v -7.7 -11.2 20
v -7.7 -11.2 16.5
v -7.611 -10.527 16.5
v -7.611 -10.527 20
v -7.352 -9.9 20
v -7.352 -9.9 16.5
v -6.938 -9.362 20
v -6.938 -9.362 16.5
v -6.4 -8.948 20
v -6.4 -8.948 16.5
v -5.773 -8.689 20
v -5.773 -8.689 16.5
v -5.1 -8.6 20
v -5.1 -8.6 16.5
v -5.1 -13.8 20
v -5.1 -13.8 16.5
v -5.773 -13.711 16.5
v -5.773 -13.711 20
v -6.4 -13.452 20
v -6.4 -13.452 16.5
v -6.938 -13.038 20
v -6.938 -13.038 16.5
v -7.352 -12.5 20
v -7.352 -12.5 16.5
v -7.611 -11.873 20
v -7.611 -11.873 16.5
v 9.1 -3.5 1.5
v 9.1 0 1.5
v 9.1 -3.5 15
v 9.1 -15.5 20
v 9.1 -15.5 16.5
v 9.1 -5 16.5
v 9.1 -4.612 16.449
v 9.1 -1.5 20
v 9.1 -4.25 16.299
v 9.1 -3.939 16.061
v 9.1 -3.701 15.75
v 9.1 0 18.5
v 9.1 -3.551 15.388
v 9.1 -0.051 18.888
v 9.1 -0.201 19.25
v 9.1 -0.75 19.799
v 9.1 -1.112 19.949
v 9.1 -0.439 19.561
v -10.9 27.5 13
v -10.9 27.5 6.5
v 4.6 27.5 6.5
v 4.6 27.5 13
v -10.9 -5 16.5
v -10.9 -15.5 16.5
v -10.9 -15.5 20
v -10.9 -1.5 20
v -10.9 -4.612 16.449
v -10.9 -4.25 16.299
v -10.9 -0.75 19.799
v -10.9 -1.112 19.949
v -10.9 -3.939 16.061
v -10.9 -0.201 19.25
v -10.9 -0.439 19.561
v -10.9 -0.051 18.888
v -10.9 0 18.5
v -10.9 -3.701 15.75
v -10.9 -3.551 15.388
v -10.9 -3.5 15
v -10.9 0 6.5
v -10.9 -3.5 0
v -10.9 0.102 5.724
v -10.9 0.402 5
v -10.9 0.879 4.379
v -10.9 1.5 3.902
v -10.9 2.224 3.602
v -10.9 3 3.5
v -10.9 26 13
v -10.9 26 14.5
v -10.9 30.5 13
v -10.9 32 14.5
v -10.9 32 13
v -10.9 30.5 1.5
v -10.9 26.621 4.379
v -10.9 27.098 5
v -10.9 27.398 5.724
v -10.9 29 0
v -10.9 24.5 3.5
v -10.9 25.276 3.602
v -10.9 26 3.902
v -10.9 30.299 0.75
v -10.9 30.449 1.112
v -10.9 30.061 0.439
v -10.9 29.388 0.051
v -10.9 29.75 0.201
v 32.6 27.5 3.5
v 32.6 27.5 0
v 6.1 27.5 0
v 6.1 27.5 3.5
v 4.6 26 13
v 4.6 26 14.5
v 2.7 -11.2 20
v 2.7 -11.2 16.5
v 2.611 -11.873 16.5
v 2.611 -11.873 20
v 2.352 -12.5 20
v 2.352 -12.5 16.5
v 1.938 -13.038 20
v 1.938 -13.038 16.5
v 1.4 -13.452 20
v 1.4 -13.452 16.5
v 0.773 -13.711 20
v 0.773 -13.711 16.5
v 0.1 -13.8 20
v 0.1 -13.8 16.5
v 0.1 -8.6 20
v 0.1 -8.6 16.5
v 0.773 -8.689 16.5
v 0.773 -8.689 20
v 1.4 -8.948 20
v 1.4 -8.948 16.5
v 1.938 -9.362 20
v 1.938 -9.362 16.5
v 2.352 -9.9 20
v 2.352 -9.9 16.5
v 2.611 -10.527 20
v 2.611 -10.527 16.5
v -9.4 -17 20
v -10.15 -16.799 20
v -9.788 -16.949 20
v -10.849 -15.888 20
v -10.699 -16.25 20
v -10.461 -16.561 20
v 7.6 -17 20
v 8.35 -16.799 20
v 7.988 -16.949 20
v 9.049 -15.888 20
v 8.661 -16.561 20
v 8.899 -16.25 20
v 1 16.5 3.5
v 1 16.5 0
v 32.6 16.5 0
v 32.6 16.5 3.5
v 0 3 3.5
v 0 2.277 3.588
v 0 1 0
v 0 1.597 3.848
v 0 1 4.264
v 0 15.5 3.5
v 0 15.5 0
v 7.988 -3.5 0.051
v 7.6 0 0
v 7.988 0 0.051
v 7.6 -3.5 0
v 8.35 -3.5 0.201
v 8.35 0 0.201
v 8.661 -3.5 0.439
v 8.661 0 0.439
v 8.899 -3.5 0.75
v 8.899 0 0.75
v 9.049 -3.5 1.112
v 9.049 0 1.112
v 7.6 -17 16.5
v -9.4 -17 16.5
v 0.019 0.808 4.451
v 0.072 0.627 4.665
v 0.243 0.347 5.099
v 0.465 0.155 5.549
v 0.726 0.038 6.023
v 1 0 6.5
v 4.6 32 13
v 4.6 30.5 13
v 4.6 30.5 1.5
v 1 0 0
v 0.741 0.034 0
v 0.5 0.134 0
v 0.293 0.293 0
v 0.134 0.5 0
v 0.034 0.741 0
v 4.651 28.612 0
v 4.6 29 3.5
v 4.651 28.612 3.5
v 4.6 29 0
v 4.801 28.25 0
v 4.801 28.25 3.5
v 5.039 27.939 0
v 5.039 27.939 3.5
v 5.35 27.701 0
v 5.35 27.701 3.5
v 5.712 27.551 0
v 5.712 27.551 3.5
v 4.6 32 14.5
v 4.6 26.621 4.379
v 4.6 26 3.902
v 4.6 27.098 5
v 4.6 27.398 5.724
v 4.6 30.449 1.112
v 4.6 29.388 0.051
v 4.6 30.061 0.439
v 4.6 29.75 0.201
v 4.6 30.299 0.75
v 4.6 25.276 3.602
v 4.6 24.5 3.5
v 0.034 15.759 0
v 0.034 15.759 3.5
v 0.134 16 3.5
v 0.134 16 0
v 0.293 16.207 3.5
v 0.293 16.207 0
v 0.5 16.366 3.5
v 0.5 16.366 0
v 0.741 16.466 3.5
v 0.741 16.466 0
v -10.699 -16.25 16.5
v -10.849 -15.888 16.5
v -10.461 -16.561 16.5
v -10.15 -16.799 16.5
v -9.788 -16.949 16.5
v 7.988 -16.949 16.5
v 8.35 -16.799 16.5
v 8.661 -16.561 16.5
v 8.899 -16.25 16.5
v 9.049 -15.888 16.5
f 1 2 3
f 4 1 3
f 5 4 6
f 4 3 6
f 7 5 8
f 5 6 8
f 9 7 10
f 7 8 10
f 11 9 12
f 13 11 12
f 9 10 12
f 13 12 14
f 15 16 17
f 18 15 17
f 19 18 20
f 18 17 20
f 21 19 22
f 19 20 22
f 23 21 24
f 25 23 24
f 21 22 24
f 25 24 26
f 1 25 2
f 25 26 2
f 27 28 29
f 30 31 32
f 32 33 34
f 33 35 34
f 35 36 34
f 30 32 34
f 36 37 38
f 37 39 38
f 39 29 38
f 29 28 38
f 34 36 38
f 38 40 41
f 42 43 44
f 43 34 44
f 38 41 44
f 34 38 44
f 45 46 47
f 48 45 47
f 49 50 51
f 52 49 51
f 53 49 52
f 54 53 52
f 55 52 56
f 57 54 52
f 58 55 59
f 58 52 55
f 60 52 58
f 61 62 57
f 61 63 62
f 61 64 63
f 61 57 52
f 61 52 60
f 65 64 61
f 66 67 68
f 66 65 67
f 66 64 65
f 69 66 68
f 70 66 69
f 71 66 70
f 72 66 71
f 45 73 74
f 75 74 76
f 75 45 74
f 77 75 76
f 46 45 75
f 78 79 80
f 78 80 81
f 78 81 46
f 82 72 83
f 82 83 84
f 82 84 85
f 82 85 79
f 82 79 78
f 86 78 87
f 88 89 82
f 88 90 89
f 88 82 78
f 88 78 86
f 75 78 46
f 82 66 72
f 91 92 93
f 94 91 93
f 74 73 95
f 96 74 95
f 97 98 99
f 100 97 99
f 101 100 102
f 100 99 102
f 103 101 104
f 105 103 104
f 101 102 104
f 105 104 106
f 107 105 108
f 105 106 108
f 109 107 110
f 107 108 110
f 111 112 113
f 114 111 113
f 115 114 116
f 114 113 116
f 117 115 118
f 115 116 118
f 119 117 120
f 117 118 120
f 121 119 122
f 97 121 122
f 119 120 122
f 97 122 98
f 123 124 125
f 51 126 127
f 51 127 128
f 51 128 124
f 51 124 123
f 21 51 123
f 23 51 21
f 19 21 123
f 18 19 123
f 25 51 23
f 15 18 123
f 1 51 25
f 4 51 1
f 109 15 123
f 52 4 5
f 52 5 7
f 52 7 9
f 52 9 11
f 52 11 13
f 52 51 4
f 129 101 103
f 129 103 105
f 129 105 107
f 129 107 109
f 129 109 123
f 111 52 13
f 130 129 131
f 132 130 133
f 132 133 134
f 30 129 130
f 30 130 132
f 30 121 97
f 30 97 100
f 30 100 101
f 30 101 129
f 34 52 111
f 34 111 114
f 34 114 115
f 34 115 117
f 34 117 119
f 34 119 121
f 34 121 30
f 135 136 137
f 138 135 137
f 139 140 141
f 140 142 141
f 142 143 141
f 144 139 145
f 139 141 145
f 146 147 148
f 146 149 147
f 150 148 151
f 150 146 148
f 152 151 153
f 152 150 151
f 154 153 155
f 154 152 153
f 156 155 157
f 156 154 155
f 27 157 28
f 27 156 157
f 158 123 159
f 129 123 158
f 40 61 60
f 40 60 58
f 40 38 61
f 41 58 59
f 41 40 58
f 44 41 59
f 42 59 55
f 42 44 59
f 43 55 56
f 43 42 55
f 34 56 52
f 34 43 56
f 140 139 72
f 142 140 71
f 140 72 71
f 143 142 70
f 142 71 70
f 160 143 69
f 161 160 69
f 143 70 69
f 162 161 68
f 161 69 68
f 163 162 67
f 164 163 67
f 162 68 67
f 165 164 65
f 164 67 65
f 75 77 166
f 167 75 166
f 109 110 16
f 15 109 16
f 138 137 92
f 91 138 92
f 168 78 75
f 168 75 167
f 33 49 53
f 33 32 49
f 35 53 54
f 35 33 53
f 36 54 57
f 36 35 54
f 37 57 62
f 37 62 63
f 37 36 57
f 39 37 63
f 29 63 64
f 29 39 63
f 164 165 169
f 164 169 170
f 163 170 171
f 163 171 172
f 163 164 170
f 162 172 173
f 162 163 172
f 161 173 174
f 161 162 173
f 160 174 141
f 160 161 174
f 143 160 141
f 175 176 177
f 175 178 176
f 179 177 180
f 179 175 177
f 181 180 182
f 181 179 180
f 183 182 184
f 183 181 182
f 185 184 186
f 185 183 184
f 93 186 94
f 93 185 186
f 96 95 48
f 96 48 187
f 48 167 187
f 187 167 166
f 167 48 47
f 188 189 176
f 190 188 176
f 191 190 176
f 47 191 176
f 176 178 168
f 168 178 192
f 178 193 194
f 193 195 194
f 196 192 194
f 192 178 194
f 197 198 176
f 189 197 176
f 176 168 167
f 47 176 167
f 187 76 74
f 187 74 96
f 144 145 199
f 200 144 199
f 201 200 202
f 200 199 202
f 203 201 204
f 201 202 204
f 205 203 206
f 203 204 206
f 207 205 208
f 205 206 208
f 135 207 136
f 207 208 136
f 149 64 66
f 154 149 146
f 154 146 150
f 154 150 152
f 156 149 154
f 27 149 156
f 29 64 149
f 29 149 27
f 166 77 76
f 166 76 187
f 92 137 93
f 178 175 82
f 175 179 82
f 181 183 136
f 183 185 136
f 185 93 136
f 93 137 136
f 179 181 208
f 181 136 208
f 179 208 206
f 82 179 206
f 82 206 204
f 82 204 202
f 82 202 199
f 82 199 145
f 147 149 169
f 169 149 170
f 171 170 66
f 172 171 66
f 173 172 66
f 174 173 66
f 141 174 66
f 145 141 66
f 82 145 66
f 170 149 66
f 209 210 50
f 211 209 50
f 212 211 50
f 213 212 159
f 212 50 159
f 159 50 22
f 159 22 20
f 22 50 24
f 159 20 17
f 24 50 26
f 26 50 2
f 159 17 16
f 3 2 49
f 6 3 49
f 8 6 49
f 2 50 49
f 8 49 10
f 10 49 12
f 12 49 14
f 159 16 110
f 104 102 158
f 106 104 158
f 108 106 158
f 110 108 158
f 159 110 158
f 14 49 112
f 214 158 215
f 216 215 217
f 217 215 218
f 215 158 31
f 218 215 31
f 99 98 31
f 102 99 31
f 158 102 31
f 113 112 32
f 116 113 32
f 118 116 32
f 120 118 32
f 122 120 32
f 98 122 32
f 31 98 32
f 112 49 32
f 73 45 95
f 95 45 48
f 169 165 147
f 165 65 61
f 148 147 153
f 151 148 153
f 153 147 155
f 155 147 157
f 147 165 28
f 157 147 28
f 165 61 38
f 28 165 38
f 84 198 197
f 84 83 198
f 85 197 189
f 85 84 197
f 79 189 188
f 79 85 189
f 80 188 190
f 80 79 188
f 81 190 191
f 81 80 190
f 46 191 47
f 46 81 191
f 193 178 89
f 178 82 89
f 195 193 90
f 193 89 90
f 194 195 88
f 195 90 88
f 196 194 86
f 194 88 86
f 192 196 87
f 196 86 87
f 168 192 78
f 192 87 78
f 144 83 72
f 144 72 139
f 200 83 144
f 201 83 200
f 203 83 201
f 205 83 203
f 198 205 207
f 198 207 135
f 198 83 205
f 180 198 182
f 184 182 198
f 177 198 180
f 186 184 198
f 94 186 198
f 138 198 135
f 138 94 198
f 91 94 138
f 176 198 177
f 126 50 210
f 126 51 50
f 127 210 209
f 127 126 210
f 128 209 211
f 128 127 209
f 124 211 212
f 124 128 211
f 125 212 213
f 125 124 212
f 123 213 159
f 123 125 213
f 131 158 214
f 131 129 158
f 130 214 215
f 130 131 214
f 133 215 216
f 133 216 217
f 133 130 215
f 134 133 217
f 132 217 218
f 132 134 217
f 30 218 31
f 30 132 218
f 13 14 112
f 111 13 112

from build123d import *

# Parameters (mm, degrees)
BOSS_EXTRUDE1_DEPTH = 3.5
SKETCH2_W           = 20
SKETCH2_H           = 20
BOSS_EXTRUDE2_DEPTH = 3.5
SKETCH3_W           = 20
SKETCH3_H           = 3.5
BOSS_EXTRUDE3_DEPTH = 13.5
BOSS_EXTRUDE4_DEPTH = 3
SKETCH5_W           = 15.5
SKETCH5_H           = 6
BOSS_EXTRUDE5_DEPTH = 1.5
FILLET1_R           = 1
FILLET2_R           = 3
FILLET3_R           = 1.5
CUT_EXTRUDE1_DEPTH  = 3.5


with BuildPart() as part:
    # Sketch1 → Boss-Extrude1 (new body)
    with BuildSketch(Plane.XY):
        with BuildLine():
            Line((0, 0), (0, 15.5))
            ThreePointArc((0, 15.5), (0.292893219, 16.207106781), (1, 16.5))
            Line((1, 16.5), (32.6, 16.5))
            Line((32.6, 16.5), (32.6, 27.5))
            Line((32.6, 27.5), (-10.9, 27.5))
            Line((-10.9, 27.5), (-10.9, 0))
            Line((-10.9, 0), (0, 0))
        make_face()
    extrude(amount=BOSS_EXTRUDE1_DEPTH)

    # Sketch2 → Boss-Extrude2 (add)
    with BuildSketch(Plane.XZ):
        with Locations((-0.9, 10)):
            Rectangle(SKETCH2_W, SKETCH2_H)
    extrude(amount=BOSS_EXTRUDE2_DEPTH)

    # Sketch3 → Boss-Extrude3 (add)
    with BuildSketch(Plane.XZ.offset(3.5)):
        with Locations((-0.9, 18.25)):
            Rectangle(SKETCH3_W, SKETCH3_H)
    extrude(amount=BOSS_EXTRUDE3_DEPTH)

    # Sketch4 → Boss-Extrude4 (add)
    with BuildSketch(Plane(origin=(0, 27.5, 0), x_dir=(1, 0, 0), z_dir=(0, 1, 0))):
        Polygon((-10.9, 0), (-10.9, -3.5), (-10.9, -13), (4.6, -13), (4.6, -3.5), (4.6, 0), align=None)
    extrude(amount=BOSS_EXTRUDE4_DEPTH)

    # Sketch5 → Boss-Extrude5 (add)
    with BuildSketch(Plane.XY.offset(13)):
        with Locations((-3.15, 29)):
            Rectangle(SKETCH5_W, SKETCH5_H)
    extrude(amount=BOSS_EXTRUDE5_DEPTH)

    # Fillet1
    fillet1_edges = [part.edges().sort_by_distance(p)[0] for p in [
        (0, 0, 1.75),
    ]]
    fillet(fillet1_edges, radius=FILLET1_R)

    # Fillet2
    fillet2_edges = [part.edges().sort_by_distance(p)[0] for p in [
        (-4.95, 0, 3.5),
        (-3.15, 27.5, 3.5),
    ]]
    fillet(fillet2_edges, radius=FILLET2_R)

    # Fillet3
    fillet3_edges = [part.edges().sort_by_distance(p)[0] for p in [
        (9.1, -1.75, 0),
        (-0.9, -3.5, 16.5),
        (9.1, -17, 18.25),
        (-10.9, -17, 18.25),
        (4.6, 27.5, 1.75),
        (-3.15, 30.5, 0),
        (-0.9, 0, 20),
    ]]
    fillet(fillet3_edges, radius=FILLET3_R - 0.0001)  # a hair under: the kernel refuses the full size

    # Sketch6 → Cut-Extrude1 (cut)
    with BuildSketch(Plane(origin=(0, 0, 16.5), x_dir=(-1, 0, 0), z_dir=(0, 0, -1))):
        with BuildLine():
            ThreePointArc((5.1, -8.6), (3.261522369, -9.361522369), (2.5, -11.2))
            Line((2.5, -11.2), (7.7, -11.2))
            ThreePointArc((7.7, -11.2), (6.938477631, -9.361522369), (5.1, -8.6))
        make_face()
        with BuildLine():
            Line((7.7, -11.2), (2.5, -11.2))
            ThreePointArc((2.5, -11.2), (3.261522369, -13.038477631), (5.1, -13.8))
            ThreePointArc((5.1, -13.8), (6.938477631, -13.038477631), (7.7, -11.2))
        make_face()
        with BuildLine():
            ThreePointArc((5.1, -13.8), (3.261522369, -13.038477631), (2.5, -11.2))
            ThreePointArc((2.5, -11.2), (1.738477631, -13.038477631), (-0.1, -13.8))
            Line((-0.1, -13.8), (5.1, -13.8))
        make_face()
        with BuildLine():
            ThreePointArc((-0.1, -8.6), (1.738477631, -9.361522369), (2.5, -11.2))
            ThreePointArc((2.5, -11.2), (3.261522369, -9.361522369), (5.1, -8.6))
            Line((5.1, -8.6), (-0.1, -8.6))
        make_face()
        with BuildLine():
            ThreePointArc((-0.1, -13.8), (1.738477631, -13.038477631), (2.5, -11.2))
            Line((2.5, -11.2), (-2.7, -11.2))
            ThreePointArc((-2.7, -11.2), (-1.938477631, -13.038477631), (-0.1, -13.8))
        make_face()
        with BuildLine():
            Line((-2.7, -11.2), (2.5, -11.2))
            ThreePointArc((2.5, -11.2), (1.738477631, -9.361522369), (-0.1, -8.6))
            ThreePointArc((-0.1, -8.6), (-1.938477631, -9.361522369), (-2.7, -11.2))
        make_face()
    extrude(amount=-CUT_EXTRUDE1_DEPTH, mode=Mode.SUBTRACT)


solid = part.part
